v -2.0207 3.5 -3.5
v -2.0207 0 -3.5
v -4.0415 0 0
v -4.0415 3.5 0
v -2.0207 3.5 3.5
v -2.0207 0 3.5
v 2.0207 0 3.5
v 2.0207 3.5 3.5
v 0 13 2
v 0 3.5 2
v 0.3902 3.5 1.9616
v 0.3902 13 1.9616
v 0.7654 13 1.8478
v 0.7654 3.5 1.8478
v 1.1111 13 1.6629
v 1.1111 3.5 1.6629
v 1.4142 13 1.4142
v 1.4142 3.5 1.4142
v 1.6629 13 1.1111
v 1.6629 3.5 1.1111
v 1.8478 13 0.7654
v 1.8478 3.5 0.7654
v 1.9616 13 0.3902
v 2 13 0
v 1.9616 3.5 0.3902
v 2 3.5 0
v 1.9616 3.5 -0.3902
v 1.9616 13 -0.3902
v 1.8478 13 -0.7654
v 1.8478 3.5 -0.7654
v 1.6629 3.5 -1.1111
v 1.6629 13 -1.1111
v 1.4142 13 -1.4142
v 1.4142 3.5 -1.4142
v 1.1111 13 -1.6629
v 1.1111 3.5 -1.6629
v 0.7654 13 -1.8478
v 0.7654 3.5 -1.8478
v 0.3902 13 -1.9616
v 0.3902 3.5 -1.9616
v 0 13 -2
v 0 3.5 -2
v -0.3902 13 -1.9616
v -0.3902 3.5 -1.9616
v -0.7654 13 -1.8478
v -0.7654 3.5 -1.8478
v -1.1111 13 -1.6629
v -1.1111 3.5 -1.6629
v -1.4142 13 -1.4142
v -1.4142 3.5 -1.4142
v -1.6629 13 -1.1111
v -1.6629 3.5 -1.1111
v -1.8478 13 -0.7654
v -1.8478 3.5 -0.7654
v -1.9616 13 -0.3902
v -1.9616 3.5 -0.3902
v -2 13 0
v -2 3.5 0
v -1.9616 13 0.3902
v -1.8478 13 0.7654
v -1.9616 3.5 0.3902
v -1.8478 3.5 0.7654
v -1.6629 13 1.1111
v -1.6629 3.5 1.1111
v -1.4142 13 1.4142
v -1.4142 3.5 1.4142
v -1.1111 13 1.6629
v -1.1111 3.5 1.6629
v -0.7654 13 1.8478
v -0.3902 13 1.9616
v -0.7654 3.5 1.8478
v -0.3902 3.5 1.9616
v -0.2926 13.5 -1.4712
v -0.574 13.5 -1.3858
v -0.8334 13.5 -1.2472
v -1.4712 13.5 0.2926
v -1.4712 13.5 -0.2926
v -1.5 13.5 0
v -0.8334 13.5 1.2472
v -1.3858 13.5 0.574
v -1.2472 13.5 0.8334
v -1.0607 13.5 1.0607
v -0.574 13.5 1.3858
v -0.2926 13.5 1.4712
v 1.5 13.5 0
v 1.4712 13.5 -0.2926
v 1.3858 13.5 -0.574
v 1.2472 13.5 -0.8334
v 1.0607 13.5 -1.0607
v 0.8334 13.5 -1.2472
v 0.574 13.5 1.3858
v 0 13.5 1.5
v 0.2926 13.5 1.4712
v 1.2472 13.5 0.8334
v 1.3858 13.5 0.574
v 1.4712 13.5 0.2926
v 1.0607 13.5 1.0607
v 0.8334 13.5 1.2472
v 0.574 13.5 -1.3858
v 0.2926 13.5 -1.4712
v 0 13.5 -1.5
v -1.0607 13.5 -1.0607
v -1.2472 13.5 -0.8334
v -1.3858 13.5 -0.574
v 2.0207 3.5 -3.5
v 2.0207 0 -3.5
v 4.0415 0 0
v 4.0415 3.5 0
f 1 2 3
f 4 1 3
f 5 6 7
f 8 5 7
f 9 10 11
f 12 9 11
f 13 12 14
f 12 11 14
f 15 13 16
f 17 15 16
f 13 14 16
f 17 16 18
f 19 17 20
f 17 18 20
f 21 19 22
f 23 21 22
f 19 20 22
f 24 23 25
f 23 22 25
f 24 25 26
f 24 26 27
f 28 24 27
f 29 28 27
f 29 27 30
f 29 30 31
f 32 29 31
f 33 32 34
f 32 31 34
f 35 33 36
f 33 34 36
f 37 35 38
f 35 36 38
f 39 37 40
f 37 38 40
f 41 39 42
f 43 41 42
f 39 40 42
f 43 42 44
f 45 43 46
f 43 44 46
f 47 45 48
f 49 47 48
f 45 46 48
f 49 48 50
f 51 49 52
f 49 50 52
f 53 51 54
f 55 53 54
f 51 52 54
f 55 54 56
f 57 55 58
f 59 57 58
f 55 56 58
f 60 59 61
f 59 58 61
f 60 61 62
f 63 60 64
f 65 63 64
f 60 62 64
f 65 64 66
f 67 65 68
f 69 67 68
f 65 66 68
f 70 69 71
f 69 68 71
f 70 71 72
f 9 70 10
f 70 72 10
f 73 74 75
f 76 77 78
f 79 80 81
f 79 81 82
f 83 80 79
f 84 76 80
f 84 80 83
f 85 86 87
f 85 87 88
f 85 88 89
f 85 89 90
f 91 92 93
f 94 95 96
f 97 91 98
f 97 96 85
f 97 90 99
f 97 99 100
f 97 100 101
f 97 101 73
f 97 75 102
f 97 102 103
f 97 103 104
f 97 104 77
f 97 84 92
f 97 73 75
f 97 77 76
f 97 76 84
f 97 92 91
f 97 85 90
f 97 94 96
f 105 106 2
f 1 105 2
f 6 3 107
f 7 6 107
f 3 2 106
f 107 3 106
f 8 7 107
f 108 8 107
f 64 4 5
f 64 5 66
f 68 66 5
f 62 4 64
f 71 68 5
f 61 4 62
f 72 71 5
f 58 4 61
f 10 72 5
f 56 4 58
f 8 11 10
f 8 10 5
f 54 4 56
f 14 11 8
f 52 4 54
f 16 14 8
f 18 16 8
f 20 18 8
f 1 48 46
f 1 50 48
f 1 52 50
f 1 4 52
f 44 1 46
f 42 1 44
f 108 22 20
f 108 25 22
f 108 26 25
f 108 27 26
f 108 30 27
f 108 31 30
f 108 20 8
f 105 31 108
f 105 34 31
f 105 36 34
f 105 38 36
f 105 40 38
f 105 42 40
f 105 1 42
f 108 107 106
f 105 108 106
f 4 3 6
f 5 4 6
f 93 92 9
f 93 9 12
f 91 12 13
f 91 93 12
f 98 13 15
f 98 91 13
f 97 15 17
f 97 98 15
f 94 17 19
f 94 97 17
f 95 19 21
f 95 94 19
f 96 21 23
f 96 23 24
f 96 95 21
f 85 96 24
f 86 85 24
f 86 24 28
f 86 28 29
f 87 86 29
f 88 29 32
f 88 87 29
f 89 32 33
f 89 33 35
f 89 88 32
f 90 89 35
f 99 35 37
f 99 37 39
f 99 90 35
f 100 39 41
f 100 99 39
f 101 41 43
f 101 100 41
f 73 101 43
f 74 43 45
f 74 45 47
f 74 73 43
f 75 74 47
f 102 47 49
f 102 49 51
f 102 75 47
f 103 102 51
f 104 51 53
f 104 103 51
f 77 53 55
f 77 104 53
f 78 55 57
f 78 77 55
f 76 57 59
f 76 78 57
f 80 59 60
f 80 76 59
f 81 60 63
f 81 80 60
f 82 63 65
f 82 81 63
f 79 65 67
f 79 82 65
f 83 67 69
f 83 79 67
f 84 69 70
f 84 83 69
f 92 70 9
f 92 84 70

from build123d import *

# Parameters (mm, degrees)
SKETCH1_R           = 2
BOSS_EXTRUDE1_DEPTH = 3.5
BOSS_EXTRUDE2_START = 3.5
SKETCH1_3_R         = 2
BOSS_EXTRUDE2_DEPTH = 10
CHAMFER1_SIZE       = 0.5


with BuildPart() as part:
    # Sketch1 → Boss-Extrude1 (new body)
    with BuildSketch(Plane(origin=(0, 0, 0), x_dir=(1, 0, 0), z_dir=(0, 1, 0))):
        Polygon((-4.041451884, 0), (-2.020725942, -3.5), (2.020725942, -3.5), (4.041451884, 0), (2.020725942, 3.5), (-2.020725942, 3.5), align=None)
        Circle(SKETCH1_R, mode=Mode.SUBTRACT)
        Circle(SKETCH1_R)
    extrude(amount=BOSS_EXTRUDE1_DEPTH)

    # Sketch1<3> → Boss-Extrude2 (add)
    with BuildSketch(Plane(origin=(0, 0, 0), x_dir=(1, 0, 0), z_dir=(0, 1, 0)).offset(BOSS_EXTRUDE2_START)):
        with Locations(Location((0, 0, 0), (0, 0, 270))):
            Circle(SKETCH1_3_R)
    extrude(amount=BOSS_EXTRUDE2_DEPTH)

    # Chamfer1
    chamfer1_edges = [part.edges().sort_by_distance(p)[0] for p in [
        (0, 13.5, -2),
    ]]
    chamfer(chamfer1_edges, length=CHAMFER1_SIZE)


solid = part.part
